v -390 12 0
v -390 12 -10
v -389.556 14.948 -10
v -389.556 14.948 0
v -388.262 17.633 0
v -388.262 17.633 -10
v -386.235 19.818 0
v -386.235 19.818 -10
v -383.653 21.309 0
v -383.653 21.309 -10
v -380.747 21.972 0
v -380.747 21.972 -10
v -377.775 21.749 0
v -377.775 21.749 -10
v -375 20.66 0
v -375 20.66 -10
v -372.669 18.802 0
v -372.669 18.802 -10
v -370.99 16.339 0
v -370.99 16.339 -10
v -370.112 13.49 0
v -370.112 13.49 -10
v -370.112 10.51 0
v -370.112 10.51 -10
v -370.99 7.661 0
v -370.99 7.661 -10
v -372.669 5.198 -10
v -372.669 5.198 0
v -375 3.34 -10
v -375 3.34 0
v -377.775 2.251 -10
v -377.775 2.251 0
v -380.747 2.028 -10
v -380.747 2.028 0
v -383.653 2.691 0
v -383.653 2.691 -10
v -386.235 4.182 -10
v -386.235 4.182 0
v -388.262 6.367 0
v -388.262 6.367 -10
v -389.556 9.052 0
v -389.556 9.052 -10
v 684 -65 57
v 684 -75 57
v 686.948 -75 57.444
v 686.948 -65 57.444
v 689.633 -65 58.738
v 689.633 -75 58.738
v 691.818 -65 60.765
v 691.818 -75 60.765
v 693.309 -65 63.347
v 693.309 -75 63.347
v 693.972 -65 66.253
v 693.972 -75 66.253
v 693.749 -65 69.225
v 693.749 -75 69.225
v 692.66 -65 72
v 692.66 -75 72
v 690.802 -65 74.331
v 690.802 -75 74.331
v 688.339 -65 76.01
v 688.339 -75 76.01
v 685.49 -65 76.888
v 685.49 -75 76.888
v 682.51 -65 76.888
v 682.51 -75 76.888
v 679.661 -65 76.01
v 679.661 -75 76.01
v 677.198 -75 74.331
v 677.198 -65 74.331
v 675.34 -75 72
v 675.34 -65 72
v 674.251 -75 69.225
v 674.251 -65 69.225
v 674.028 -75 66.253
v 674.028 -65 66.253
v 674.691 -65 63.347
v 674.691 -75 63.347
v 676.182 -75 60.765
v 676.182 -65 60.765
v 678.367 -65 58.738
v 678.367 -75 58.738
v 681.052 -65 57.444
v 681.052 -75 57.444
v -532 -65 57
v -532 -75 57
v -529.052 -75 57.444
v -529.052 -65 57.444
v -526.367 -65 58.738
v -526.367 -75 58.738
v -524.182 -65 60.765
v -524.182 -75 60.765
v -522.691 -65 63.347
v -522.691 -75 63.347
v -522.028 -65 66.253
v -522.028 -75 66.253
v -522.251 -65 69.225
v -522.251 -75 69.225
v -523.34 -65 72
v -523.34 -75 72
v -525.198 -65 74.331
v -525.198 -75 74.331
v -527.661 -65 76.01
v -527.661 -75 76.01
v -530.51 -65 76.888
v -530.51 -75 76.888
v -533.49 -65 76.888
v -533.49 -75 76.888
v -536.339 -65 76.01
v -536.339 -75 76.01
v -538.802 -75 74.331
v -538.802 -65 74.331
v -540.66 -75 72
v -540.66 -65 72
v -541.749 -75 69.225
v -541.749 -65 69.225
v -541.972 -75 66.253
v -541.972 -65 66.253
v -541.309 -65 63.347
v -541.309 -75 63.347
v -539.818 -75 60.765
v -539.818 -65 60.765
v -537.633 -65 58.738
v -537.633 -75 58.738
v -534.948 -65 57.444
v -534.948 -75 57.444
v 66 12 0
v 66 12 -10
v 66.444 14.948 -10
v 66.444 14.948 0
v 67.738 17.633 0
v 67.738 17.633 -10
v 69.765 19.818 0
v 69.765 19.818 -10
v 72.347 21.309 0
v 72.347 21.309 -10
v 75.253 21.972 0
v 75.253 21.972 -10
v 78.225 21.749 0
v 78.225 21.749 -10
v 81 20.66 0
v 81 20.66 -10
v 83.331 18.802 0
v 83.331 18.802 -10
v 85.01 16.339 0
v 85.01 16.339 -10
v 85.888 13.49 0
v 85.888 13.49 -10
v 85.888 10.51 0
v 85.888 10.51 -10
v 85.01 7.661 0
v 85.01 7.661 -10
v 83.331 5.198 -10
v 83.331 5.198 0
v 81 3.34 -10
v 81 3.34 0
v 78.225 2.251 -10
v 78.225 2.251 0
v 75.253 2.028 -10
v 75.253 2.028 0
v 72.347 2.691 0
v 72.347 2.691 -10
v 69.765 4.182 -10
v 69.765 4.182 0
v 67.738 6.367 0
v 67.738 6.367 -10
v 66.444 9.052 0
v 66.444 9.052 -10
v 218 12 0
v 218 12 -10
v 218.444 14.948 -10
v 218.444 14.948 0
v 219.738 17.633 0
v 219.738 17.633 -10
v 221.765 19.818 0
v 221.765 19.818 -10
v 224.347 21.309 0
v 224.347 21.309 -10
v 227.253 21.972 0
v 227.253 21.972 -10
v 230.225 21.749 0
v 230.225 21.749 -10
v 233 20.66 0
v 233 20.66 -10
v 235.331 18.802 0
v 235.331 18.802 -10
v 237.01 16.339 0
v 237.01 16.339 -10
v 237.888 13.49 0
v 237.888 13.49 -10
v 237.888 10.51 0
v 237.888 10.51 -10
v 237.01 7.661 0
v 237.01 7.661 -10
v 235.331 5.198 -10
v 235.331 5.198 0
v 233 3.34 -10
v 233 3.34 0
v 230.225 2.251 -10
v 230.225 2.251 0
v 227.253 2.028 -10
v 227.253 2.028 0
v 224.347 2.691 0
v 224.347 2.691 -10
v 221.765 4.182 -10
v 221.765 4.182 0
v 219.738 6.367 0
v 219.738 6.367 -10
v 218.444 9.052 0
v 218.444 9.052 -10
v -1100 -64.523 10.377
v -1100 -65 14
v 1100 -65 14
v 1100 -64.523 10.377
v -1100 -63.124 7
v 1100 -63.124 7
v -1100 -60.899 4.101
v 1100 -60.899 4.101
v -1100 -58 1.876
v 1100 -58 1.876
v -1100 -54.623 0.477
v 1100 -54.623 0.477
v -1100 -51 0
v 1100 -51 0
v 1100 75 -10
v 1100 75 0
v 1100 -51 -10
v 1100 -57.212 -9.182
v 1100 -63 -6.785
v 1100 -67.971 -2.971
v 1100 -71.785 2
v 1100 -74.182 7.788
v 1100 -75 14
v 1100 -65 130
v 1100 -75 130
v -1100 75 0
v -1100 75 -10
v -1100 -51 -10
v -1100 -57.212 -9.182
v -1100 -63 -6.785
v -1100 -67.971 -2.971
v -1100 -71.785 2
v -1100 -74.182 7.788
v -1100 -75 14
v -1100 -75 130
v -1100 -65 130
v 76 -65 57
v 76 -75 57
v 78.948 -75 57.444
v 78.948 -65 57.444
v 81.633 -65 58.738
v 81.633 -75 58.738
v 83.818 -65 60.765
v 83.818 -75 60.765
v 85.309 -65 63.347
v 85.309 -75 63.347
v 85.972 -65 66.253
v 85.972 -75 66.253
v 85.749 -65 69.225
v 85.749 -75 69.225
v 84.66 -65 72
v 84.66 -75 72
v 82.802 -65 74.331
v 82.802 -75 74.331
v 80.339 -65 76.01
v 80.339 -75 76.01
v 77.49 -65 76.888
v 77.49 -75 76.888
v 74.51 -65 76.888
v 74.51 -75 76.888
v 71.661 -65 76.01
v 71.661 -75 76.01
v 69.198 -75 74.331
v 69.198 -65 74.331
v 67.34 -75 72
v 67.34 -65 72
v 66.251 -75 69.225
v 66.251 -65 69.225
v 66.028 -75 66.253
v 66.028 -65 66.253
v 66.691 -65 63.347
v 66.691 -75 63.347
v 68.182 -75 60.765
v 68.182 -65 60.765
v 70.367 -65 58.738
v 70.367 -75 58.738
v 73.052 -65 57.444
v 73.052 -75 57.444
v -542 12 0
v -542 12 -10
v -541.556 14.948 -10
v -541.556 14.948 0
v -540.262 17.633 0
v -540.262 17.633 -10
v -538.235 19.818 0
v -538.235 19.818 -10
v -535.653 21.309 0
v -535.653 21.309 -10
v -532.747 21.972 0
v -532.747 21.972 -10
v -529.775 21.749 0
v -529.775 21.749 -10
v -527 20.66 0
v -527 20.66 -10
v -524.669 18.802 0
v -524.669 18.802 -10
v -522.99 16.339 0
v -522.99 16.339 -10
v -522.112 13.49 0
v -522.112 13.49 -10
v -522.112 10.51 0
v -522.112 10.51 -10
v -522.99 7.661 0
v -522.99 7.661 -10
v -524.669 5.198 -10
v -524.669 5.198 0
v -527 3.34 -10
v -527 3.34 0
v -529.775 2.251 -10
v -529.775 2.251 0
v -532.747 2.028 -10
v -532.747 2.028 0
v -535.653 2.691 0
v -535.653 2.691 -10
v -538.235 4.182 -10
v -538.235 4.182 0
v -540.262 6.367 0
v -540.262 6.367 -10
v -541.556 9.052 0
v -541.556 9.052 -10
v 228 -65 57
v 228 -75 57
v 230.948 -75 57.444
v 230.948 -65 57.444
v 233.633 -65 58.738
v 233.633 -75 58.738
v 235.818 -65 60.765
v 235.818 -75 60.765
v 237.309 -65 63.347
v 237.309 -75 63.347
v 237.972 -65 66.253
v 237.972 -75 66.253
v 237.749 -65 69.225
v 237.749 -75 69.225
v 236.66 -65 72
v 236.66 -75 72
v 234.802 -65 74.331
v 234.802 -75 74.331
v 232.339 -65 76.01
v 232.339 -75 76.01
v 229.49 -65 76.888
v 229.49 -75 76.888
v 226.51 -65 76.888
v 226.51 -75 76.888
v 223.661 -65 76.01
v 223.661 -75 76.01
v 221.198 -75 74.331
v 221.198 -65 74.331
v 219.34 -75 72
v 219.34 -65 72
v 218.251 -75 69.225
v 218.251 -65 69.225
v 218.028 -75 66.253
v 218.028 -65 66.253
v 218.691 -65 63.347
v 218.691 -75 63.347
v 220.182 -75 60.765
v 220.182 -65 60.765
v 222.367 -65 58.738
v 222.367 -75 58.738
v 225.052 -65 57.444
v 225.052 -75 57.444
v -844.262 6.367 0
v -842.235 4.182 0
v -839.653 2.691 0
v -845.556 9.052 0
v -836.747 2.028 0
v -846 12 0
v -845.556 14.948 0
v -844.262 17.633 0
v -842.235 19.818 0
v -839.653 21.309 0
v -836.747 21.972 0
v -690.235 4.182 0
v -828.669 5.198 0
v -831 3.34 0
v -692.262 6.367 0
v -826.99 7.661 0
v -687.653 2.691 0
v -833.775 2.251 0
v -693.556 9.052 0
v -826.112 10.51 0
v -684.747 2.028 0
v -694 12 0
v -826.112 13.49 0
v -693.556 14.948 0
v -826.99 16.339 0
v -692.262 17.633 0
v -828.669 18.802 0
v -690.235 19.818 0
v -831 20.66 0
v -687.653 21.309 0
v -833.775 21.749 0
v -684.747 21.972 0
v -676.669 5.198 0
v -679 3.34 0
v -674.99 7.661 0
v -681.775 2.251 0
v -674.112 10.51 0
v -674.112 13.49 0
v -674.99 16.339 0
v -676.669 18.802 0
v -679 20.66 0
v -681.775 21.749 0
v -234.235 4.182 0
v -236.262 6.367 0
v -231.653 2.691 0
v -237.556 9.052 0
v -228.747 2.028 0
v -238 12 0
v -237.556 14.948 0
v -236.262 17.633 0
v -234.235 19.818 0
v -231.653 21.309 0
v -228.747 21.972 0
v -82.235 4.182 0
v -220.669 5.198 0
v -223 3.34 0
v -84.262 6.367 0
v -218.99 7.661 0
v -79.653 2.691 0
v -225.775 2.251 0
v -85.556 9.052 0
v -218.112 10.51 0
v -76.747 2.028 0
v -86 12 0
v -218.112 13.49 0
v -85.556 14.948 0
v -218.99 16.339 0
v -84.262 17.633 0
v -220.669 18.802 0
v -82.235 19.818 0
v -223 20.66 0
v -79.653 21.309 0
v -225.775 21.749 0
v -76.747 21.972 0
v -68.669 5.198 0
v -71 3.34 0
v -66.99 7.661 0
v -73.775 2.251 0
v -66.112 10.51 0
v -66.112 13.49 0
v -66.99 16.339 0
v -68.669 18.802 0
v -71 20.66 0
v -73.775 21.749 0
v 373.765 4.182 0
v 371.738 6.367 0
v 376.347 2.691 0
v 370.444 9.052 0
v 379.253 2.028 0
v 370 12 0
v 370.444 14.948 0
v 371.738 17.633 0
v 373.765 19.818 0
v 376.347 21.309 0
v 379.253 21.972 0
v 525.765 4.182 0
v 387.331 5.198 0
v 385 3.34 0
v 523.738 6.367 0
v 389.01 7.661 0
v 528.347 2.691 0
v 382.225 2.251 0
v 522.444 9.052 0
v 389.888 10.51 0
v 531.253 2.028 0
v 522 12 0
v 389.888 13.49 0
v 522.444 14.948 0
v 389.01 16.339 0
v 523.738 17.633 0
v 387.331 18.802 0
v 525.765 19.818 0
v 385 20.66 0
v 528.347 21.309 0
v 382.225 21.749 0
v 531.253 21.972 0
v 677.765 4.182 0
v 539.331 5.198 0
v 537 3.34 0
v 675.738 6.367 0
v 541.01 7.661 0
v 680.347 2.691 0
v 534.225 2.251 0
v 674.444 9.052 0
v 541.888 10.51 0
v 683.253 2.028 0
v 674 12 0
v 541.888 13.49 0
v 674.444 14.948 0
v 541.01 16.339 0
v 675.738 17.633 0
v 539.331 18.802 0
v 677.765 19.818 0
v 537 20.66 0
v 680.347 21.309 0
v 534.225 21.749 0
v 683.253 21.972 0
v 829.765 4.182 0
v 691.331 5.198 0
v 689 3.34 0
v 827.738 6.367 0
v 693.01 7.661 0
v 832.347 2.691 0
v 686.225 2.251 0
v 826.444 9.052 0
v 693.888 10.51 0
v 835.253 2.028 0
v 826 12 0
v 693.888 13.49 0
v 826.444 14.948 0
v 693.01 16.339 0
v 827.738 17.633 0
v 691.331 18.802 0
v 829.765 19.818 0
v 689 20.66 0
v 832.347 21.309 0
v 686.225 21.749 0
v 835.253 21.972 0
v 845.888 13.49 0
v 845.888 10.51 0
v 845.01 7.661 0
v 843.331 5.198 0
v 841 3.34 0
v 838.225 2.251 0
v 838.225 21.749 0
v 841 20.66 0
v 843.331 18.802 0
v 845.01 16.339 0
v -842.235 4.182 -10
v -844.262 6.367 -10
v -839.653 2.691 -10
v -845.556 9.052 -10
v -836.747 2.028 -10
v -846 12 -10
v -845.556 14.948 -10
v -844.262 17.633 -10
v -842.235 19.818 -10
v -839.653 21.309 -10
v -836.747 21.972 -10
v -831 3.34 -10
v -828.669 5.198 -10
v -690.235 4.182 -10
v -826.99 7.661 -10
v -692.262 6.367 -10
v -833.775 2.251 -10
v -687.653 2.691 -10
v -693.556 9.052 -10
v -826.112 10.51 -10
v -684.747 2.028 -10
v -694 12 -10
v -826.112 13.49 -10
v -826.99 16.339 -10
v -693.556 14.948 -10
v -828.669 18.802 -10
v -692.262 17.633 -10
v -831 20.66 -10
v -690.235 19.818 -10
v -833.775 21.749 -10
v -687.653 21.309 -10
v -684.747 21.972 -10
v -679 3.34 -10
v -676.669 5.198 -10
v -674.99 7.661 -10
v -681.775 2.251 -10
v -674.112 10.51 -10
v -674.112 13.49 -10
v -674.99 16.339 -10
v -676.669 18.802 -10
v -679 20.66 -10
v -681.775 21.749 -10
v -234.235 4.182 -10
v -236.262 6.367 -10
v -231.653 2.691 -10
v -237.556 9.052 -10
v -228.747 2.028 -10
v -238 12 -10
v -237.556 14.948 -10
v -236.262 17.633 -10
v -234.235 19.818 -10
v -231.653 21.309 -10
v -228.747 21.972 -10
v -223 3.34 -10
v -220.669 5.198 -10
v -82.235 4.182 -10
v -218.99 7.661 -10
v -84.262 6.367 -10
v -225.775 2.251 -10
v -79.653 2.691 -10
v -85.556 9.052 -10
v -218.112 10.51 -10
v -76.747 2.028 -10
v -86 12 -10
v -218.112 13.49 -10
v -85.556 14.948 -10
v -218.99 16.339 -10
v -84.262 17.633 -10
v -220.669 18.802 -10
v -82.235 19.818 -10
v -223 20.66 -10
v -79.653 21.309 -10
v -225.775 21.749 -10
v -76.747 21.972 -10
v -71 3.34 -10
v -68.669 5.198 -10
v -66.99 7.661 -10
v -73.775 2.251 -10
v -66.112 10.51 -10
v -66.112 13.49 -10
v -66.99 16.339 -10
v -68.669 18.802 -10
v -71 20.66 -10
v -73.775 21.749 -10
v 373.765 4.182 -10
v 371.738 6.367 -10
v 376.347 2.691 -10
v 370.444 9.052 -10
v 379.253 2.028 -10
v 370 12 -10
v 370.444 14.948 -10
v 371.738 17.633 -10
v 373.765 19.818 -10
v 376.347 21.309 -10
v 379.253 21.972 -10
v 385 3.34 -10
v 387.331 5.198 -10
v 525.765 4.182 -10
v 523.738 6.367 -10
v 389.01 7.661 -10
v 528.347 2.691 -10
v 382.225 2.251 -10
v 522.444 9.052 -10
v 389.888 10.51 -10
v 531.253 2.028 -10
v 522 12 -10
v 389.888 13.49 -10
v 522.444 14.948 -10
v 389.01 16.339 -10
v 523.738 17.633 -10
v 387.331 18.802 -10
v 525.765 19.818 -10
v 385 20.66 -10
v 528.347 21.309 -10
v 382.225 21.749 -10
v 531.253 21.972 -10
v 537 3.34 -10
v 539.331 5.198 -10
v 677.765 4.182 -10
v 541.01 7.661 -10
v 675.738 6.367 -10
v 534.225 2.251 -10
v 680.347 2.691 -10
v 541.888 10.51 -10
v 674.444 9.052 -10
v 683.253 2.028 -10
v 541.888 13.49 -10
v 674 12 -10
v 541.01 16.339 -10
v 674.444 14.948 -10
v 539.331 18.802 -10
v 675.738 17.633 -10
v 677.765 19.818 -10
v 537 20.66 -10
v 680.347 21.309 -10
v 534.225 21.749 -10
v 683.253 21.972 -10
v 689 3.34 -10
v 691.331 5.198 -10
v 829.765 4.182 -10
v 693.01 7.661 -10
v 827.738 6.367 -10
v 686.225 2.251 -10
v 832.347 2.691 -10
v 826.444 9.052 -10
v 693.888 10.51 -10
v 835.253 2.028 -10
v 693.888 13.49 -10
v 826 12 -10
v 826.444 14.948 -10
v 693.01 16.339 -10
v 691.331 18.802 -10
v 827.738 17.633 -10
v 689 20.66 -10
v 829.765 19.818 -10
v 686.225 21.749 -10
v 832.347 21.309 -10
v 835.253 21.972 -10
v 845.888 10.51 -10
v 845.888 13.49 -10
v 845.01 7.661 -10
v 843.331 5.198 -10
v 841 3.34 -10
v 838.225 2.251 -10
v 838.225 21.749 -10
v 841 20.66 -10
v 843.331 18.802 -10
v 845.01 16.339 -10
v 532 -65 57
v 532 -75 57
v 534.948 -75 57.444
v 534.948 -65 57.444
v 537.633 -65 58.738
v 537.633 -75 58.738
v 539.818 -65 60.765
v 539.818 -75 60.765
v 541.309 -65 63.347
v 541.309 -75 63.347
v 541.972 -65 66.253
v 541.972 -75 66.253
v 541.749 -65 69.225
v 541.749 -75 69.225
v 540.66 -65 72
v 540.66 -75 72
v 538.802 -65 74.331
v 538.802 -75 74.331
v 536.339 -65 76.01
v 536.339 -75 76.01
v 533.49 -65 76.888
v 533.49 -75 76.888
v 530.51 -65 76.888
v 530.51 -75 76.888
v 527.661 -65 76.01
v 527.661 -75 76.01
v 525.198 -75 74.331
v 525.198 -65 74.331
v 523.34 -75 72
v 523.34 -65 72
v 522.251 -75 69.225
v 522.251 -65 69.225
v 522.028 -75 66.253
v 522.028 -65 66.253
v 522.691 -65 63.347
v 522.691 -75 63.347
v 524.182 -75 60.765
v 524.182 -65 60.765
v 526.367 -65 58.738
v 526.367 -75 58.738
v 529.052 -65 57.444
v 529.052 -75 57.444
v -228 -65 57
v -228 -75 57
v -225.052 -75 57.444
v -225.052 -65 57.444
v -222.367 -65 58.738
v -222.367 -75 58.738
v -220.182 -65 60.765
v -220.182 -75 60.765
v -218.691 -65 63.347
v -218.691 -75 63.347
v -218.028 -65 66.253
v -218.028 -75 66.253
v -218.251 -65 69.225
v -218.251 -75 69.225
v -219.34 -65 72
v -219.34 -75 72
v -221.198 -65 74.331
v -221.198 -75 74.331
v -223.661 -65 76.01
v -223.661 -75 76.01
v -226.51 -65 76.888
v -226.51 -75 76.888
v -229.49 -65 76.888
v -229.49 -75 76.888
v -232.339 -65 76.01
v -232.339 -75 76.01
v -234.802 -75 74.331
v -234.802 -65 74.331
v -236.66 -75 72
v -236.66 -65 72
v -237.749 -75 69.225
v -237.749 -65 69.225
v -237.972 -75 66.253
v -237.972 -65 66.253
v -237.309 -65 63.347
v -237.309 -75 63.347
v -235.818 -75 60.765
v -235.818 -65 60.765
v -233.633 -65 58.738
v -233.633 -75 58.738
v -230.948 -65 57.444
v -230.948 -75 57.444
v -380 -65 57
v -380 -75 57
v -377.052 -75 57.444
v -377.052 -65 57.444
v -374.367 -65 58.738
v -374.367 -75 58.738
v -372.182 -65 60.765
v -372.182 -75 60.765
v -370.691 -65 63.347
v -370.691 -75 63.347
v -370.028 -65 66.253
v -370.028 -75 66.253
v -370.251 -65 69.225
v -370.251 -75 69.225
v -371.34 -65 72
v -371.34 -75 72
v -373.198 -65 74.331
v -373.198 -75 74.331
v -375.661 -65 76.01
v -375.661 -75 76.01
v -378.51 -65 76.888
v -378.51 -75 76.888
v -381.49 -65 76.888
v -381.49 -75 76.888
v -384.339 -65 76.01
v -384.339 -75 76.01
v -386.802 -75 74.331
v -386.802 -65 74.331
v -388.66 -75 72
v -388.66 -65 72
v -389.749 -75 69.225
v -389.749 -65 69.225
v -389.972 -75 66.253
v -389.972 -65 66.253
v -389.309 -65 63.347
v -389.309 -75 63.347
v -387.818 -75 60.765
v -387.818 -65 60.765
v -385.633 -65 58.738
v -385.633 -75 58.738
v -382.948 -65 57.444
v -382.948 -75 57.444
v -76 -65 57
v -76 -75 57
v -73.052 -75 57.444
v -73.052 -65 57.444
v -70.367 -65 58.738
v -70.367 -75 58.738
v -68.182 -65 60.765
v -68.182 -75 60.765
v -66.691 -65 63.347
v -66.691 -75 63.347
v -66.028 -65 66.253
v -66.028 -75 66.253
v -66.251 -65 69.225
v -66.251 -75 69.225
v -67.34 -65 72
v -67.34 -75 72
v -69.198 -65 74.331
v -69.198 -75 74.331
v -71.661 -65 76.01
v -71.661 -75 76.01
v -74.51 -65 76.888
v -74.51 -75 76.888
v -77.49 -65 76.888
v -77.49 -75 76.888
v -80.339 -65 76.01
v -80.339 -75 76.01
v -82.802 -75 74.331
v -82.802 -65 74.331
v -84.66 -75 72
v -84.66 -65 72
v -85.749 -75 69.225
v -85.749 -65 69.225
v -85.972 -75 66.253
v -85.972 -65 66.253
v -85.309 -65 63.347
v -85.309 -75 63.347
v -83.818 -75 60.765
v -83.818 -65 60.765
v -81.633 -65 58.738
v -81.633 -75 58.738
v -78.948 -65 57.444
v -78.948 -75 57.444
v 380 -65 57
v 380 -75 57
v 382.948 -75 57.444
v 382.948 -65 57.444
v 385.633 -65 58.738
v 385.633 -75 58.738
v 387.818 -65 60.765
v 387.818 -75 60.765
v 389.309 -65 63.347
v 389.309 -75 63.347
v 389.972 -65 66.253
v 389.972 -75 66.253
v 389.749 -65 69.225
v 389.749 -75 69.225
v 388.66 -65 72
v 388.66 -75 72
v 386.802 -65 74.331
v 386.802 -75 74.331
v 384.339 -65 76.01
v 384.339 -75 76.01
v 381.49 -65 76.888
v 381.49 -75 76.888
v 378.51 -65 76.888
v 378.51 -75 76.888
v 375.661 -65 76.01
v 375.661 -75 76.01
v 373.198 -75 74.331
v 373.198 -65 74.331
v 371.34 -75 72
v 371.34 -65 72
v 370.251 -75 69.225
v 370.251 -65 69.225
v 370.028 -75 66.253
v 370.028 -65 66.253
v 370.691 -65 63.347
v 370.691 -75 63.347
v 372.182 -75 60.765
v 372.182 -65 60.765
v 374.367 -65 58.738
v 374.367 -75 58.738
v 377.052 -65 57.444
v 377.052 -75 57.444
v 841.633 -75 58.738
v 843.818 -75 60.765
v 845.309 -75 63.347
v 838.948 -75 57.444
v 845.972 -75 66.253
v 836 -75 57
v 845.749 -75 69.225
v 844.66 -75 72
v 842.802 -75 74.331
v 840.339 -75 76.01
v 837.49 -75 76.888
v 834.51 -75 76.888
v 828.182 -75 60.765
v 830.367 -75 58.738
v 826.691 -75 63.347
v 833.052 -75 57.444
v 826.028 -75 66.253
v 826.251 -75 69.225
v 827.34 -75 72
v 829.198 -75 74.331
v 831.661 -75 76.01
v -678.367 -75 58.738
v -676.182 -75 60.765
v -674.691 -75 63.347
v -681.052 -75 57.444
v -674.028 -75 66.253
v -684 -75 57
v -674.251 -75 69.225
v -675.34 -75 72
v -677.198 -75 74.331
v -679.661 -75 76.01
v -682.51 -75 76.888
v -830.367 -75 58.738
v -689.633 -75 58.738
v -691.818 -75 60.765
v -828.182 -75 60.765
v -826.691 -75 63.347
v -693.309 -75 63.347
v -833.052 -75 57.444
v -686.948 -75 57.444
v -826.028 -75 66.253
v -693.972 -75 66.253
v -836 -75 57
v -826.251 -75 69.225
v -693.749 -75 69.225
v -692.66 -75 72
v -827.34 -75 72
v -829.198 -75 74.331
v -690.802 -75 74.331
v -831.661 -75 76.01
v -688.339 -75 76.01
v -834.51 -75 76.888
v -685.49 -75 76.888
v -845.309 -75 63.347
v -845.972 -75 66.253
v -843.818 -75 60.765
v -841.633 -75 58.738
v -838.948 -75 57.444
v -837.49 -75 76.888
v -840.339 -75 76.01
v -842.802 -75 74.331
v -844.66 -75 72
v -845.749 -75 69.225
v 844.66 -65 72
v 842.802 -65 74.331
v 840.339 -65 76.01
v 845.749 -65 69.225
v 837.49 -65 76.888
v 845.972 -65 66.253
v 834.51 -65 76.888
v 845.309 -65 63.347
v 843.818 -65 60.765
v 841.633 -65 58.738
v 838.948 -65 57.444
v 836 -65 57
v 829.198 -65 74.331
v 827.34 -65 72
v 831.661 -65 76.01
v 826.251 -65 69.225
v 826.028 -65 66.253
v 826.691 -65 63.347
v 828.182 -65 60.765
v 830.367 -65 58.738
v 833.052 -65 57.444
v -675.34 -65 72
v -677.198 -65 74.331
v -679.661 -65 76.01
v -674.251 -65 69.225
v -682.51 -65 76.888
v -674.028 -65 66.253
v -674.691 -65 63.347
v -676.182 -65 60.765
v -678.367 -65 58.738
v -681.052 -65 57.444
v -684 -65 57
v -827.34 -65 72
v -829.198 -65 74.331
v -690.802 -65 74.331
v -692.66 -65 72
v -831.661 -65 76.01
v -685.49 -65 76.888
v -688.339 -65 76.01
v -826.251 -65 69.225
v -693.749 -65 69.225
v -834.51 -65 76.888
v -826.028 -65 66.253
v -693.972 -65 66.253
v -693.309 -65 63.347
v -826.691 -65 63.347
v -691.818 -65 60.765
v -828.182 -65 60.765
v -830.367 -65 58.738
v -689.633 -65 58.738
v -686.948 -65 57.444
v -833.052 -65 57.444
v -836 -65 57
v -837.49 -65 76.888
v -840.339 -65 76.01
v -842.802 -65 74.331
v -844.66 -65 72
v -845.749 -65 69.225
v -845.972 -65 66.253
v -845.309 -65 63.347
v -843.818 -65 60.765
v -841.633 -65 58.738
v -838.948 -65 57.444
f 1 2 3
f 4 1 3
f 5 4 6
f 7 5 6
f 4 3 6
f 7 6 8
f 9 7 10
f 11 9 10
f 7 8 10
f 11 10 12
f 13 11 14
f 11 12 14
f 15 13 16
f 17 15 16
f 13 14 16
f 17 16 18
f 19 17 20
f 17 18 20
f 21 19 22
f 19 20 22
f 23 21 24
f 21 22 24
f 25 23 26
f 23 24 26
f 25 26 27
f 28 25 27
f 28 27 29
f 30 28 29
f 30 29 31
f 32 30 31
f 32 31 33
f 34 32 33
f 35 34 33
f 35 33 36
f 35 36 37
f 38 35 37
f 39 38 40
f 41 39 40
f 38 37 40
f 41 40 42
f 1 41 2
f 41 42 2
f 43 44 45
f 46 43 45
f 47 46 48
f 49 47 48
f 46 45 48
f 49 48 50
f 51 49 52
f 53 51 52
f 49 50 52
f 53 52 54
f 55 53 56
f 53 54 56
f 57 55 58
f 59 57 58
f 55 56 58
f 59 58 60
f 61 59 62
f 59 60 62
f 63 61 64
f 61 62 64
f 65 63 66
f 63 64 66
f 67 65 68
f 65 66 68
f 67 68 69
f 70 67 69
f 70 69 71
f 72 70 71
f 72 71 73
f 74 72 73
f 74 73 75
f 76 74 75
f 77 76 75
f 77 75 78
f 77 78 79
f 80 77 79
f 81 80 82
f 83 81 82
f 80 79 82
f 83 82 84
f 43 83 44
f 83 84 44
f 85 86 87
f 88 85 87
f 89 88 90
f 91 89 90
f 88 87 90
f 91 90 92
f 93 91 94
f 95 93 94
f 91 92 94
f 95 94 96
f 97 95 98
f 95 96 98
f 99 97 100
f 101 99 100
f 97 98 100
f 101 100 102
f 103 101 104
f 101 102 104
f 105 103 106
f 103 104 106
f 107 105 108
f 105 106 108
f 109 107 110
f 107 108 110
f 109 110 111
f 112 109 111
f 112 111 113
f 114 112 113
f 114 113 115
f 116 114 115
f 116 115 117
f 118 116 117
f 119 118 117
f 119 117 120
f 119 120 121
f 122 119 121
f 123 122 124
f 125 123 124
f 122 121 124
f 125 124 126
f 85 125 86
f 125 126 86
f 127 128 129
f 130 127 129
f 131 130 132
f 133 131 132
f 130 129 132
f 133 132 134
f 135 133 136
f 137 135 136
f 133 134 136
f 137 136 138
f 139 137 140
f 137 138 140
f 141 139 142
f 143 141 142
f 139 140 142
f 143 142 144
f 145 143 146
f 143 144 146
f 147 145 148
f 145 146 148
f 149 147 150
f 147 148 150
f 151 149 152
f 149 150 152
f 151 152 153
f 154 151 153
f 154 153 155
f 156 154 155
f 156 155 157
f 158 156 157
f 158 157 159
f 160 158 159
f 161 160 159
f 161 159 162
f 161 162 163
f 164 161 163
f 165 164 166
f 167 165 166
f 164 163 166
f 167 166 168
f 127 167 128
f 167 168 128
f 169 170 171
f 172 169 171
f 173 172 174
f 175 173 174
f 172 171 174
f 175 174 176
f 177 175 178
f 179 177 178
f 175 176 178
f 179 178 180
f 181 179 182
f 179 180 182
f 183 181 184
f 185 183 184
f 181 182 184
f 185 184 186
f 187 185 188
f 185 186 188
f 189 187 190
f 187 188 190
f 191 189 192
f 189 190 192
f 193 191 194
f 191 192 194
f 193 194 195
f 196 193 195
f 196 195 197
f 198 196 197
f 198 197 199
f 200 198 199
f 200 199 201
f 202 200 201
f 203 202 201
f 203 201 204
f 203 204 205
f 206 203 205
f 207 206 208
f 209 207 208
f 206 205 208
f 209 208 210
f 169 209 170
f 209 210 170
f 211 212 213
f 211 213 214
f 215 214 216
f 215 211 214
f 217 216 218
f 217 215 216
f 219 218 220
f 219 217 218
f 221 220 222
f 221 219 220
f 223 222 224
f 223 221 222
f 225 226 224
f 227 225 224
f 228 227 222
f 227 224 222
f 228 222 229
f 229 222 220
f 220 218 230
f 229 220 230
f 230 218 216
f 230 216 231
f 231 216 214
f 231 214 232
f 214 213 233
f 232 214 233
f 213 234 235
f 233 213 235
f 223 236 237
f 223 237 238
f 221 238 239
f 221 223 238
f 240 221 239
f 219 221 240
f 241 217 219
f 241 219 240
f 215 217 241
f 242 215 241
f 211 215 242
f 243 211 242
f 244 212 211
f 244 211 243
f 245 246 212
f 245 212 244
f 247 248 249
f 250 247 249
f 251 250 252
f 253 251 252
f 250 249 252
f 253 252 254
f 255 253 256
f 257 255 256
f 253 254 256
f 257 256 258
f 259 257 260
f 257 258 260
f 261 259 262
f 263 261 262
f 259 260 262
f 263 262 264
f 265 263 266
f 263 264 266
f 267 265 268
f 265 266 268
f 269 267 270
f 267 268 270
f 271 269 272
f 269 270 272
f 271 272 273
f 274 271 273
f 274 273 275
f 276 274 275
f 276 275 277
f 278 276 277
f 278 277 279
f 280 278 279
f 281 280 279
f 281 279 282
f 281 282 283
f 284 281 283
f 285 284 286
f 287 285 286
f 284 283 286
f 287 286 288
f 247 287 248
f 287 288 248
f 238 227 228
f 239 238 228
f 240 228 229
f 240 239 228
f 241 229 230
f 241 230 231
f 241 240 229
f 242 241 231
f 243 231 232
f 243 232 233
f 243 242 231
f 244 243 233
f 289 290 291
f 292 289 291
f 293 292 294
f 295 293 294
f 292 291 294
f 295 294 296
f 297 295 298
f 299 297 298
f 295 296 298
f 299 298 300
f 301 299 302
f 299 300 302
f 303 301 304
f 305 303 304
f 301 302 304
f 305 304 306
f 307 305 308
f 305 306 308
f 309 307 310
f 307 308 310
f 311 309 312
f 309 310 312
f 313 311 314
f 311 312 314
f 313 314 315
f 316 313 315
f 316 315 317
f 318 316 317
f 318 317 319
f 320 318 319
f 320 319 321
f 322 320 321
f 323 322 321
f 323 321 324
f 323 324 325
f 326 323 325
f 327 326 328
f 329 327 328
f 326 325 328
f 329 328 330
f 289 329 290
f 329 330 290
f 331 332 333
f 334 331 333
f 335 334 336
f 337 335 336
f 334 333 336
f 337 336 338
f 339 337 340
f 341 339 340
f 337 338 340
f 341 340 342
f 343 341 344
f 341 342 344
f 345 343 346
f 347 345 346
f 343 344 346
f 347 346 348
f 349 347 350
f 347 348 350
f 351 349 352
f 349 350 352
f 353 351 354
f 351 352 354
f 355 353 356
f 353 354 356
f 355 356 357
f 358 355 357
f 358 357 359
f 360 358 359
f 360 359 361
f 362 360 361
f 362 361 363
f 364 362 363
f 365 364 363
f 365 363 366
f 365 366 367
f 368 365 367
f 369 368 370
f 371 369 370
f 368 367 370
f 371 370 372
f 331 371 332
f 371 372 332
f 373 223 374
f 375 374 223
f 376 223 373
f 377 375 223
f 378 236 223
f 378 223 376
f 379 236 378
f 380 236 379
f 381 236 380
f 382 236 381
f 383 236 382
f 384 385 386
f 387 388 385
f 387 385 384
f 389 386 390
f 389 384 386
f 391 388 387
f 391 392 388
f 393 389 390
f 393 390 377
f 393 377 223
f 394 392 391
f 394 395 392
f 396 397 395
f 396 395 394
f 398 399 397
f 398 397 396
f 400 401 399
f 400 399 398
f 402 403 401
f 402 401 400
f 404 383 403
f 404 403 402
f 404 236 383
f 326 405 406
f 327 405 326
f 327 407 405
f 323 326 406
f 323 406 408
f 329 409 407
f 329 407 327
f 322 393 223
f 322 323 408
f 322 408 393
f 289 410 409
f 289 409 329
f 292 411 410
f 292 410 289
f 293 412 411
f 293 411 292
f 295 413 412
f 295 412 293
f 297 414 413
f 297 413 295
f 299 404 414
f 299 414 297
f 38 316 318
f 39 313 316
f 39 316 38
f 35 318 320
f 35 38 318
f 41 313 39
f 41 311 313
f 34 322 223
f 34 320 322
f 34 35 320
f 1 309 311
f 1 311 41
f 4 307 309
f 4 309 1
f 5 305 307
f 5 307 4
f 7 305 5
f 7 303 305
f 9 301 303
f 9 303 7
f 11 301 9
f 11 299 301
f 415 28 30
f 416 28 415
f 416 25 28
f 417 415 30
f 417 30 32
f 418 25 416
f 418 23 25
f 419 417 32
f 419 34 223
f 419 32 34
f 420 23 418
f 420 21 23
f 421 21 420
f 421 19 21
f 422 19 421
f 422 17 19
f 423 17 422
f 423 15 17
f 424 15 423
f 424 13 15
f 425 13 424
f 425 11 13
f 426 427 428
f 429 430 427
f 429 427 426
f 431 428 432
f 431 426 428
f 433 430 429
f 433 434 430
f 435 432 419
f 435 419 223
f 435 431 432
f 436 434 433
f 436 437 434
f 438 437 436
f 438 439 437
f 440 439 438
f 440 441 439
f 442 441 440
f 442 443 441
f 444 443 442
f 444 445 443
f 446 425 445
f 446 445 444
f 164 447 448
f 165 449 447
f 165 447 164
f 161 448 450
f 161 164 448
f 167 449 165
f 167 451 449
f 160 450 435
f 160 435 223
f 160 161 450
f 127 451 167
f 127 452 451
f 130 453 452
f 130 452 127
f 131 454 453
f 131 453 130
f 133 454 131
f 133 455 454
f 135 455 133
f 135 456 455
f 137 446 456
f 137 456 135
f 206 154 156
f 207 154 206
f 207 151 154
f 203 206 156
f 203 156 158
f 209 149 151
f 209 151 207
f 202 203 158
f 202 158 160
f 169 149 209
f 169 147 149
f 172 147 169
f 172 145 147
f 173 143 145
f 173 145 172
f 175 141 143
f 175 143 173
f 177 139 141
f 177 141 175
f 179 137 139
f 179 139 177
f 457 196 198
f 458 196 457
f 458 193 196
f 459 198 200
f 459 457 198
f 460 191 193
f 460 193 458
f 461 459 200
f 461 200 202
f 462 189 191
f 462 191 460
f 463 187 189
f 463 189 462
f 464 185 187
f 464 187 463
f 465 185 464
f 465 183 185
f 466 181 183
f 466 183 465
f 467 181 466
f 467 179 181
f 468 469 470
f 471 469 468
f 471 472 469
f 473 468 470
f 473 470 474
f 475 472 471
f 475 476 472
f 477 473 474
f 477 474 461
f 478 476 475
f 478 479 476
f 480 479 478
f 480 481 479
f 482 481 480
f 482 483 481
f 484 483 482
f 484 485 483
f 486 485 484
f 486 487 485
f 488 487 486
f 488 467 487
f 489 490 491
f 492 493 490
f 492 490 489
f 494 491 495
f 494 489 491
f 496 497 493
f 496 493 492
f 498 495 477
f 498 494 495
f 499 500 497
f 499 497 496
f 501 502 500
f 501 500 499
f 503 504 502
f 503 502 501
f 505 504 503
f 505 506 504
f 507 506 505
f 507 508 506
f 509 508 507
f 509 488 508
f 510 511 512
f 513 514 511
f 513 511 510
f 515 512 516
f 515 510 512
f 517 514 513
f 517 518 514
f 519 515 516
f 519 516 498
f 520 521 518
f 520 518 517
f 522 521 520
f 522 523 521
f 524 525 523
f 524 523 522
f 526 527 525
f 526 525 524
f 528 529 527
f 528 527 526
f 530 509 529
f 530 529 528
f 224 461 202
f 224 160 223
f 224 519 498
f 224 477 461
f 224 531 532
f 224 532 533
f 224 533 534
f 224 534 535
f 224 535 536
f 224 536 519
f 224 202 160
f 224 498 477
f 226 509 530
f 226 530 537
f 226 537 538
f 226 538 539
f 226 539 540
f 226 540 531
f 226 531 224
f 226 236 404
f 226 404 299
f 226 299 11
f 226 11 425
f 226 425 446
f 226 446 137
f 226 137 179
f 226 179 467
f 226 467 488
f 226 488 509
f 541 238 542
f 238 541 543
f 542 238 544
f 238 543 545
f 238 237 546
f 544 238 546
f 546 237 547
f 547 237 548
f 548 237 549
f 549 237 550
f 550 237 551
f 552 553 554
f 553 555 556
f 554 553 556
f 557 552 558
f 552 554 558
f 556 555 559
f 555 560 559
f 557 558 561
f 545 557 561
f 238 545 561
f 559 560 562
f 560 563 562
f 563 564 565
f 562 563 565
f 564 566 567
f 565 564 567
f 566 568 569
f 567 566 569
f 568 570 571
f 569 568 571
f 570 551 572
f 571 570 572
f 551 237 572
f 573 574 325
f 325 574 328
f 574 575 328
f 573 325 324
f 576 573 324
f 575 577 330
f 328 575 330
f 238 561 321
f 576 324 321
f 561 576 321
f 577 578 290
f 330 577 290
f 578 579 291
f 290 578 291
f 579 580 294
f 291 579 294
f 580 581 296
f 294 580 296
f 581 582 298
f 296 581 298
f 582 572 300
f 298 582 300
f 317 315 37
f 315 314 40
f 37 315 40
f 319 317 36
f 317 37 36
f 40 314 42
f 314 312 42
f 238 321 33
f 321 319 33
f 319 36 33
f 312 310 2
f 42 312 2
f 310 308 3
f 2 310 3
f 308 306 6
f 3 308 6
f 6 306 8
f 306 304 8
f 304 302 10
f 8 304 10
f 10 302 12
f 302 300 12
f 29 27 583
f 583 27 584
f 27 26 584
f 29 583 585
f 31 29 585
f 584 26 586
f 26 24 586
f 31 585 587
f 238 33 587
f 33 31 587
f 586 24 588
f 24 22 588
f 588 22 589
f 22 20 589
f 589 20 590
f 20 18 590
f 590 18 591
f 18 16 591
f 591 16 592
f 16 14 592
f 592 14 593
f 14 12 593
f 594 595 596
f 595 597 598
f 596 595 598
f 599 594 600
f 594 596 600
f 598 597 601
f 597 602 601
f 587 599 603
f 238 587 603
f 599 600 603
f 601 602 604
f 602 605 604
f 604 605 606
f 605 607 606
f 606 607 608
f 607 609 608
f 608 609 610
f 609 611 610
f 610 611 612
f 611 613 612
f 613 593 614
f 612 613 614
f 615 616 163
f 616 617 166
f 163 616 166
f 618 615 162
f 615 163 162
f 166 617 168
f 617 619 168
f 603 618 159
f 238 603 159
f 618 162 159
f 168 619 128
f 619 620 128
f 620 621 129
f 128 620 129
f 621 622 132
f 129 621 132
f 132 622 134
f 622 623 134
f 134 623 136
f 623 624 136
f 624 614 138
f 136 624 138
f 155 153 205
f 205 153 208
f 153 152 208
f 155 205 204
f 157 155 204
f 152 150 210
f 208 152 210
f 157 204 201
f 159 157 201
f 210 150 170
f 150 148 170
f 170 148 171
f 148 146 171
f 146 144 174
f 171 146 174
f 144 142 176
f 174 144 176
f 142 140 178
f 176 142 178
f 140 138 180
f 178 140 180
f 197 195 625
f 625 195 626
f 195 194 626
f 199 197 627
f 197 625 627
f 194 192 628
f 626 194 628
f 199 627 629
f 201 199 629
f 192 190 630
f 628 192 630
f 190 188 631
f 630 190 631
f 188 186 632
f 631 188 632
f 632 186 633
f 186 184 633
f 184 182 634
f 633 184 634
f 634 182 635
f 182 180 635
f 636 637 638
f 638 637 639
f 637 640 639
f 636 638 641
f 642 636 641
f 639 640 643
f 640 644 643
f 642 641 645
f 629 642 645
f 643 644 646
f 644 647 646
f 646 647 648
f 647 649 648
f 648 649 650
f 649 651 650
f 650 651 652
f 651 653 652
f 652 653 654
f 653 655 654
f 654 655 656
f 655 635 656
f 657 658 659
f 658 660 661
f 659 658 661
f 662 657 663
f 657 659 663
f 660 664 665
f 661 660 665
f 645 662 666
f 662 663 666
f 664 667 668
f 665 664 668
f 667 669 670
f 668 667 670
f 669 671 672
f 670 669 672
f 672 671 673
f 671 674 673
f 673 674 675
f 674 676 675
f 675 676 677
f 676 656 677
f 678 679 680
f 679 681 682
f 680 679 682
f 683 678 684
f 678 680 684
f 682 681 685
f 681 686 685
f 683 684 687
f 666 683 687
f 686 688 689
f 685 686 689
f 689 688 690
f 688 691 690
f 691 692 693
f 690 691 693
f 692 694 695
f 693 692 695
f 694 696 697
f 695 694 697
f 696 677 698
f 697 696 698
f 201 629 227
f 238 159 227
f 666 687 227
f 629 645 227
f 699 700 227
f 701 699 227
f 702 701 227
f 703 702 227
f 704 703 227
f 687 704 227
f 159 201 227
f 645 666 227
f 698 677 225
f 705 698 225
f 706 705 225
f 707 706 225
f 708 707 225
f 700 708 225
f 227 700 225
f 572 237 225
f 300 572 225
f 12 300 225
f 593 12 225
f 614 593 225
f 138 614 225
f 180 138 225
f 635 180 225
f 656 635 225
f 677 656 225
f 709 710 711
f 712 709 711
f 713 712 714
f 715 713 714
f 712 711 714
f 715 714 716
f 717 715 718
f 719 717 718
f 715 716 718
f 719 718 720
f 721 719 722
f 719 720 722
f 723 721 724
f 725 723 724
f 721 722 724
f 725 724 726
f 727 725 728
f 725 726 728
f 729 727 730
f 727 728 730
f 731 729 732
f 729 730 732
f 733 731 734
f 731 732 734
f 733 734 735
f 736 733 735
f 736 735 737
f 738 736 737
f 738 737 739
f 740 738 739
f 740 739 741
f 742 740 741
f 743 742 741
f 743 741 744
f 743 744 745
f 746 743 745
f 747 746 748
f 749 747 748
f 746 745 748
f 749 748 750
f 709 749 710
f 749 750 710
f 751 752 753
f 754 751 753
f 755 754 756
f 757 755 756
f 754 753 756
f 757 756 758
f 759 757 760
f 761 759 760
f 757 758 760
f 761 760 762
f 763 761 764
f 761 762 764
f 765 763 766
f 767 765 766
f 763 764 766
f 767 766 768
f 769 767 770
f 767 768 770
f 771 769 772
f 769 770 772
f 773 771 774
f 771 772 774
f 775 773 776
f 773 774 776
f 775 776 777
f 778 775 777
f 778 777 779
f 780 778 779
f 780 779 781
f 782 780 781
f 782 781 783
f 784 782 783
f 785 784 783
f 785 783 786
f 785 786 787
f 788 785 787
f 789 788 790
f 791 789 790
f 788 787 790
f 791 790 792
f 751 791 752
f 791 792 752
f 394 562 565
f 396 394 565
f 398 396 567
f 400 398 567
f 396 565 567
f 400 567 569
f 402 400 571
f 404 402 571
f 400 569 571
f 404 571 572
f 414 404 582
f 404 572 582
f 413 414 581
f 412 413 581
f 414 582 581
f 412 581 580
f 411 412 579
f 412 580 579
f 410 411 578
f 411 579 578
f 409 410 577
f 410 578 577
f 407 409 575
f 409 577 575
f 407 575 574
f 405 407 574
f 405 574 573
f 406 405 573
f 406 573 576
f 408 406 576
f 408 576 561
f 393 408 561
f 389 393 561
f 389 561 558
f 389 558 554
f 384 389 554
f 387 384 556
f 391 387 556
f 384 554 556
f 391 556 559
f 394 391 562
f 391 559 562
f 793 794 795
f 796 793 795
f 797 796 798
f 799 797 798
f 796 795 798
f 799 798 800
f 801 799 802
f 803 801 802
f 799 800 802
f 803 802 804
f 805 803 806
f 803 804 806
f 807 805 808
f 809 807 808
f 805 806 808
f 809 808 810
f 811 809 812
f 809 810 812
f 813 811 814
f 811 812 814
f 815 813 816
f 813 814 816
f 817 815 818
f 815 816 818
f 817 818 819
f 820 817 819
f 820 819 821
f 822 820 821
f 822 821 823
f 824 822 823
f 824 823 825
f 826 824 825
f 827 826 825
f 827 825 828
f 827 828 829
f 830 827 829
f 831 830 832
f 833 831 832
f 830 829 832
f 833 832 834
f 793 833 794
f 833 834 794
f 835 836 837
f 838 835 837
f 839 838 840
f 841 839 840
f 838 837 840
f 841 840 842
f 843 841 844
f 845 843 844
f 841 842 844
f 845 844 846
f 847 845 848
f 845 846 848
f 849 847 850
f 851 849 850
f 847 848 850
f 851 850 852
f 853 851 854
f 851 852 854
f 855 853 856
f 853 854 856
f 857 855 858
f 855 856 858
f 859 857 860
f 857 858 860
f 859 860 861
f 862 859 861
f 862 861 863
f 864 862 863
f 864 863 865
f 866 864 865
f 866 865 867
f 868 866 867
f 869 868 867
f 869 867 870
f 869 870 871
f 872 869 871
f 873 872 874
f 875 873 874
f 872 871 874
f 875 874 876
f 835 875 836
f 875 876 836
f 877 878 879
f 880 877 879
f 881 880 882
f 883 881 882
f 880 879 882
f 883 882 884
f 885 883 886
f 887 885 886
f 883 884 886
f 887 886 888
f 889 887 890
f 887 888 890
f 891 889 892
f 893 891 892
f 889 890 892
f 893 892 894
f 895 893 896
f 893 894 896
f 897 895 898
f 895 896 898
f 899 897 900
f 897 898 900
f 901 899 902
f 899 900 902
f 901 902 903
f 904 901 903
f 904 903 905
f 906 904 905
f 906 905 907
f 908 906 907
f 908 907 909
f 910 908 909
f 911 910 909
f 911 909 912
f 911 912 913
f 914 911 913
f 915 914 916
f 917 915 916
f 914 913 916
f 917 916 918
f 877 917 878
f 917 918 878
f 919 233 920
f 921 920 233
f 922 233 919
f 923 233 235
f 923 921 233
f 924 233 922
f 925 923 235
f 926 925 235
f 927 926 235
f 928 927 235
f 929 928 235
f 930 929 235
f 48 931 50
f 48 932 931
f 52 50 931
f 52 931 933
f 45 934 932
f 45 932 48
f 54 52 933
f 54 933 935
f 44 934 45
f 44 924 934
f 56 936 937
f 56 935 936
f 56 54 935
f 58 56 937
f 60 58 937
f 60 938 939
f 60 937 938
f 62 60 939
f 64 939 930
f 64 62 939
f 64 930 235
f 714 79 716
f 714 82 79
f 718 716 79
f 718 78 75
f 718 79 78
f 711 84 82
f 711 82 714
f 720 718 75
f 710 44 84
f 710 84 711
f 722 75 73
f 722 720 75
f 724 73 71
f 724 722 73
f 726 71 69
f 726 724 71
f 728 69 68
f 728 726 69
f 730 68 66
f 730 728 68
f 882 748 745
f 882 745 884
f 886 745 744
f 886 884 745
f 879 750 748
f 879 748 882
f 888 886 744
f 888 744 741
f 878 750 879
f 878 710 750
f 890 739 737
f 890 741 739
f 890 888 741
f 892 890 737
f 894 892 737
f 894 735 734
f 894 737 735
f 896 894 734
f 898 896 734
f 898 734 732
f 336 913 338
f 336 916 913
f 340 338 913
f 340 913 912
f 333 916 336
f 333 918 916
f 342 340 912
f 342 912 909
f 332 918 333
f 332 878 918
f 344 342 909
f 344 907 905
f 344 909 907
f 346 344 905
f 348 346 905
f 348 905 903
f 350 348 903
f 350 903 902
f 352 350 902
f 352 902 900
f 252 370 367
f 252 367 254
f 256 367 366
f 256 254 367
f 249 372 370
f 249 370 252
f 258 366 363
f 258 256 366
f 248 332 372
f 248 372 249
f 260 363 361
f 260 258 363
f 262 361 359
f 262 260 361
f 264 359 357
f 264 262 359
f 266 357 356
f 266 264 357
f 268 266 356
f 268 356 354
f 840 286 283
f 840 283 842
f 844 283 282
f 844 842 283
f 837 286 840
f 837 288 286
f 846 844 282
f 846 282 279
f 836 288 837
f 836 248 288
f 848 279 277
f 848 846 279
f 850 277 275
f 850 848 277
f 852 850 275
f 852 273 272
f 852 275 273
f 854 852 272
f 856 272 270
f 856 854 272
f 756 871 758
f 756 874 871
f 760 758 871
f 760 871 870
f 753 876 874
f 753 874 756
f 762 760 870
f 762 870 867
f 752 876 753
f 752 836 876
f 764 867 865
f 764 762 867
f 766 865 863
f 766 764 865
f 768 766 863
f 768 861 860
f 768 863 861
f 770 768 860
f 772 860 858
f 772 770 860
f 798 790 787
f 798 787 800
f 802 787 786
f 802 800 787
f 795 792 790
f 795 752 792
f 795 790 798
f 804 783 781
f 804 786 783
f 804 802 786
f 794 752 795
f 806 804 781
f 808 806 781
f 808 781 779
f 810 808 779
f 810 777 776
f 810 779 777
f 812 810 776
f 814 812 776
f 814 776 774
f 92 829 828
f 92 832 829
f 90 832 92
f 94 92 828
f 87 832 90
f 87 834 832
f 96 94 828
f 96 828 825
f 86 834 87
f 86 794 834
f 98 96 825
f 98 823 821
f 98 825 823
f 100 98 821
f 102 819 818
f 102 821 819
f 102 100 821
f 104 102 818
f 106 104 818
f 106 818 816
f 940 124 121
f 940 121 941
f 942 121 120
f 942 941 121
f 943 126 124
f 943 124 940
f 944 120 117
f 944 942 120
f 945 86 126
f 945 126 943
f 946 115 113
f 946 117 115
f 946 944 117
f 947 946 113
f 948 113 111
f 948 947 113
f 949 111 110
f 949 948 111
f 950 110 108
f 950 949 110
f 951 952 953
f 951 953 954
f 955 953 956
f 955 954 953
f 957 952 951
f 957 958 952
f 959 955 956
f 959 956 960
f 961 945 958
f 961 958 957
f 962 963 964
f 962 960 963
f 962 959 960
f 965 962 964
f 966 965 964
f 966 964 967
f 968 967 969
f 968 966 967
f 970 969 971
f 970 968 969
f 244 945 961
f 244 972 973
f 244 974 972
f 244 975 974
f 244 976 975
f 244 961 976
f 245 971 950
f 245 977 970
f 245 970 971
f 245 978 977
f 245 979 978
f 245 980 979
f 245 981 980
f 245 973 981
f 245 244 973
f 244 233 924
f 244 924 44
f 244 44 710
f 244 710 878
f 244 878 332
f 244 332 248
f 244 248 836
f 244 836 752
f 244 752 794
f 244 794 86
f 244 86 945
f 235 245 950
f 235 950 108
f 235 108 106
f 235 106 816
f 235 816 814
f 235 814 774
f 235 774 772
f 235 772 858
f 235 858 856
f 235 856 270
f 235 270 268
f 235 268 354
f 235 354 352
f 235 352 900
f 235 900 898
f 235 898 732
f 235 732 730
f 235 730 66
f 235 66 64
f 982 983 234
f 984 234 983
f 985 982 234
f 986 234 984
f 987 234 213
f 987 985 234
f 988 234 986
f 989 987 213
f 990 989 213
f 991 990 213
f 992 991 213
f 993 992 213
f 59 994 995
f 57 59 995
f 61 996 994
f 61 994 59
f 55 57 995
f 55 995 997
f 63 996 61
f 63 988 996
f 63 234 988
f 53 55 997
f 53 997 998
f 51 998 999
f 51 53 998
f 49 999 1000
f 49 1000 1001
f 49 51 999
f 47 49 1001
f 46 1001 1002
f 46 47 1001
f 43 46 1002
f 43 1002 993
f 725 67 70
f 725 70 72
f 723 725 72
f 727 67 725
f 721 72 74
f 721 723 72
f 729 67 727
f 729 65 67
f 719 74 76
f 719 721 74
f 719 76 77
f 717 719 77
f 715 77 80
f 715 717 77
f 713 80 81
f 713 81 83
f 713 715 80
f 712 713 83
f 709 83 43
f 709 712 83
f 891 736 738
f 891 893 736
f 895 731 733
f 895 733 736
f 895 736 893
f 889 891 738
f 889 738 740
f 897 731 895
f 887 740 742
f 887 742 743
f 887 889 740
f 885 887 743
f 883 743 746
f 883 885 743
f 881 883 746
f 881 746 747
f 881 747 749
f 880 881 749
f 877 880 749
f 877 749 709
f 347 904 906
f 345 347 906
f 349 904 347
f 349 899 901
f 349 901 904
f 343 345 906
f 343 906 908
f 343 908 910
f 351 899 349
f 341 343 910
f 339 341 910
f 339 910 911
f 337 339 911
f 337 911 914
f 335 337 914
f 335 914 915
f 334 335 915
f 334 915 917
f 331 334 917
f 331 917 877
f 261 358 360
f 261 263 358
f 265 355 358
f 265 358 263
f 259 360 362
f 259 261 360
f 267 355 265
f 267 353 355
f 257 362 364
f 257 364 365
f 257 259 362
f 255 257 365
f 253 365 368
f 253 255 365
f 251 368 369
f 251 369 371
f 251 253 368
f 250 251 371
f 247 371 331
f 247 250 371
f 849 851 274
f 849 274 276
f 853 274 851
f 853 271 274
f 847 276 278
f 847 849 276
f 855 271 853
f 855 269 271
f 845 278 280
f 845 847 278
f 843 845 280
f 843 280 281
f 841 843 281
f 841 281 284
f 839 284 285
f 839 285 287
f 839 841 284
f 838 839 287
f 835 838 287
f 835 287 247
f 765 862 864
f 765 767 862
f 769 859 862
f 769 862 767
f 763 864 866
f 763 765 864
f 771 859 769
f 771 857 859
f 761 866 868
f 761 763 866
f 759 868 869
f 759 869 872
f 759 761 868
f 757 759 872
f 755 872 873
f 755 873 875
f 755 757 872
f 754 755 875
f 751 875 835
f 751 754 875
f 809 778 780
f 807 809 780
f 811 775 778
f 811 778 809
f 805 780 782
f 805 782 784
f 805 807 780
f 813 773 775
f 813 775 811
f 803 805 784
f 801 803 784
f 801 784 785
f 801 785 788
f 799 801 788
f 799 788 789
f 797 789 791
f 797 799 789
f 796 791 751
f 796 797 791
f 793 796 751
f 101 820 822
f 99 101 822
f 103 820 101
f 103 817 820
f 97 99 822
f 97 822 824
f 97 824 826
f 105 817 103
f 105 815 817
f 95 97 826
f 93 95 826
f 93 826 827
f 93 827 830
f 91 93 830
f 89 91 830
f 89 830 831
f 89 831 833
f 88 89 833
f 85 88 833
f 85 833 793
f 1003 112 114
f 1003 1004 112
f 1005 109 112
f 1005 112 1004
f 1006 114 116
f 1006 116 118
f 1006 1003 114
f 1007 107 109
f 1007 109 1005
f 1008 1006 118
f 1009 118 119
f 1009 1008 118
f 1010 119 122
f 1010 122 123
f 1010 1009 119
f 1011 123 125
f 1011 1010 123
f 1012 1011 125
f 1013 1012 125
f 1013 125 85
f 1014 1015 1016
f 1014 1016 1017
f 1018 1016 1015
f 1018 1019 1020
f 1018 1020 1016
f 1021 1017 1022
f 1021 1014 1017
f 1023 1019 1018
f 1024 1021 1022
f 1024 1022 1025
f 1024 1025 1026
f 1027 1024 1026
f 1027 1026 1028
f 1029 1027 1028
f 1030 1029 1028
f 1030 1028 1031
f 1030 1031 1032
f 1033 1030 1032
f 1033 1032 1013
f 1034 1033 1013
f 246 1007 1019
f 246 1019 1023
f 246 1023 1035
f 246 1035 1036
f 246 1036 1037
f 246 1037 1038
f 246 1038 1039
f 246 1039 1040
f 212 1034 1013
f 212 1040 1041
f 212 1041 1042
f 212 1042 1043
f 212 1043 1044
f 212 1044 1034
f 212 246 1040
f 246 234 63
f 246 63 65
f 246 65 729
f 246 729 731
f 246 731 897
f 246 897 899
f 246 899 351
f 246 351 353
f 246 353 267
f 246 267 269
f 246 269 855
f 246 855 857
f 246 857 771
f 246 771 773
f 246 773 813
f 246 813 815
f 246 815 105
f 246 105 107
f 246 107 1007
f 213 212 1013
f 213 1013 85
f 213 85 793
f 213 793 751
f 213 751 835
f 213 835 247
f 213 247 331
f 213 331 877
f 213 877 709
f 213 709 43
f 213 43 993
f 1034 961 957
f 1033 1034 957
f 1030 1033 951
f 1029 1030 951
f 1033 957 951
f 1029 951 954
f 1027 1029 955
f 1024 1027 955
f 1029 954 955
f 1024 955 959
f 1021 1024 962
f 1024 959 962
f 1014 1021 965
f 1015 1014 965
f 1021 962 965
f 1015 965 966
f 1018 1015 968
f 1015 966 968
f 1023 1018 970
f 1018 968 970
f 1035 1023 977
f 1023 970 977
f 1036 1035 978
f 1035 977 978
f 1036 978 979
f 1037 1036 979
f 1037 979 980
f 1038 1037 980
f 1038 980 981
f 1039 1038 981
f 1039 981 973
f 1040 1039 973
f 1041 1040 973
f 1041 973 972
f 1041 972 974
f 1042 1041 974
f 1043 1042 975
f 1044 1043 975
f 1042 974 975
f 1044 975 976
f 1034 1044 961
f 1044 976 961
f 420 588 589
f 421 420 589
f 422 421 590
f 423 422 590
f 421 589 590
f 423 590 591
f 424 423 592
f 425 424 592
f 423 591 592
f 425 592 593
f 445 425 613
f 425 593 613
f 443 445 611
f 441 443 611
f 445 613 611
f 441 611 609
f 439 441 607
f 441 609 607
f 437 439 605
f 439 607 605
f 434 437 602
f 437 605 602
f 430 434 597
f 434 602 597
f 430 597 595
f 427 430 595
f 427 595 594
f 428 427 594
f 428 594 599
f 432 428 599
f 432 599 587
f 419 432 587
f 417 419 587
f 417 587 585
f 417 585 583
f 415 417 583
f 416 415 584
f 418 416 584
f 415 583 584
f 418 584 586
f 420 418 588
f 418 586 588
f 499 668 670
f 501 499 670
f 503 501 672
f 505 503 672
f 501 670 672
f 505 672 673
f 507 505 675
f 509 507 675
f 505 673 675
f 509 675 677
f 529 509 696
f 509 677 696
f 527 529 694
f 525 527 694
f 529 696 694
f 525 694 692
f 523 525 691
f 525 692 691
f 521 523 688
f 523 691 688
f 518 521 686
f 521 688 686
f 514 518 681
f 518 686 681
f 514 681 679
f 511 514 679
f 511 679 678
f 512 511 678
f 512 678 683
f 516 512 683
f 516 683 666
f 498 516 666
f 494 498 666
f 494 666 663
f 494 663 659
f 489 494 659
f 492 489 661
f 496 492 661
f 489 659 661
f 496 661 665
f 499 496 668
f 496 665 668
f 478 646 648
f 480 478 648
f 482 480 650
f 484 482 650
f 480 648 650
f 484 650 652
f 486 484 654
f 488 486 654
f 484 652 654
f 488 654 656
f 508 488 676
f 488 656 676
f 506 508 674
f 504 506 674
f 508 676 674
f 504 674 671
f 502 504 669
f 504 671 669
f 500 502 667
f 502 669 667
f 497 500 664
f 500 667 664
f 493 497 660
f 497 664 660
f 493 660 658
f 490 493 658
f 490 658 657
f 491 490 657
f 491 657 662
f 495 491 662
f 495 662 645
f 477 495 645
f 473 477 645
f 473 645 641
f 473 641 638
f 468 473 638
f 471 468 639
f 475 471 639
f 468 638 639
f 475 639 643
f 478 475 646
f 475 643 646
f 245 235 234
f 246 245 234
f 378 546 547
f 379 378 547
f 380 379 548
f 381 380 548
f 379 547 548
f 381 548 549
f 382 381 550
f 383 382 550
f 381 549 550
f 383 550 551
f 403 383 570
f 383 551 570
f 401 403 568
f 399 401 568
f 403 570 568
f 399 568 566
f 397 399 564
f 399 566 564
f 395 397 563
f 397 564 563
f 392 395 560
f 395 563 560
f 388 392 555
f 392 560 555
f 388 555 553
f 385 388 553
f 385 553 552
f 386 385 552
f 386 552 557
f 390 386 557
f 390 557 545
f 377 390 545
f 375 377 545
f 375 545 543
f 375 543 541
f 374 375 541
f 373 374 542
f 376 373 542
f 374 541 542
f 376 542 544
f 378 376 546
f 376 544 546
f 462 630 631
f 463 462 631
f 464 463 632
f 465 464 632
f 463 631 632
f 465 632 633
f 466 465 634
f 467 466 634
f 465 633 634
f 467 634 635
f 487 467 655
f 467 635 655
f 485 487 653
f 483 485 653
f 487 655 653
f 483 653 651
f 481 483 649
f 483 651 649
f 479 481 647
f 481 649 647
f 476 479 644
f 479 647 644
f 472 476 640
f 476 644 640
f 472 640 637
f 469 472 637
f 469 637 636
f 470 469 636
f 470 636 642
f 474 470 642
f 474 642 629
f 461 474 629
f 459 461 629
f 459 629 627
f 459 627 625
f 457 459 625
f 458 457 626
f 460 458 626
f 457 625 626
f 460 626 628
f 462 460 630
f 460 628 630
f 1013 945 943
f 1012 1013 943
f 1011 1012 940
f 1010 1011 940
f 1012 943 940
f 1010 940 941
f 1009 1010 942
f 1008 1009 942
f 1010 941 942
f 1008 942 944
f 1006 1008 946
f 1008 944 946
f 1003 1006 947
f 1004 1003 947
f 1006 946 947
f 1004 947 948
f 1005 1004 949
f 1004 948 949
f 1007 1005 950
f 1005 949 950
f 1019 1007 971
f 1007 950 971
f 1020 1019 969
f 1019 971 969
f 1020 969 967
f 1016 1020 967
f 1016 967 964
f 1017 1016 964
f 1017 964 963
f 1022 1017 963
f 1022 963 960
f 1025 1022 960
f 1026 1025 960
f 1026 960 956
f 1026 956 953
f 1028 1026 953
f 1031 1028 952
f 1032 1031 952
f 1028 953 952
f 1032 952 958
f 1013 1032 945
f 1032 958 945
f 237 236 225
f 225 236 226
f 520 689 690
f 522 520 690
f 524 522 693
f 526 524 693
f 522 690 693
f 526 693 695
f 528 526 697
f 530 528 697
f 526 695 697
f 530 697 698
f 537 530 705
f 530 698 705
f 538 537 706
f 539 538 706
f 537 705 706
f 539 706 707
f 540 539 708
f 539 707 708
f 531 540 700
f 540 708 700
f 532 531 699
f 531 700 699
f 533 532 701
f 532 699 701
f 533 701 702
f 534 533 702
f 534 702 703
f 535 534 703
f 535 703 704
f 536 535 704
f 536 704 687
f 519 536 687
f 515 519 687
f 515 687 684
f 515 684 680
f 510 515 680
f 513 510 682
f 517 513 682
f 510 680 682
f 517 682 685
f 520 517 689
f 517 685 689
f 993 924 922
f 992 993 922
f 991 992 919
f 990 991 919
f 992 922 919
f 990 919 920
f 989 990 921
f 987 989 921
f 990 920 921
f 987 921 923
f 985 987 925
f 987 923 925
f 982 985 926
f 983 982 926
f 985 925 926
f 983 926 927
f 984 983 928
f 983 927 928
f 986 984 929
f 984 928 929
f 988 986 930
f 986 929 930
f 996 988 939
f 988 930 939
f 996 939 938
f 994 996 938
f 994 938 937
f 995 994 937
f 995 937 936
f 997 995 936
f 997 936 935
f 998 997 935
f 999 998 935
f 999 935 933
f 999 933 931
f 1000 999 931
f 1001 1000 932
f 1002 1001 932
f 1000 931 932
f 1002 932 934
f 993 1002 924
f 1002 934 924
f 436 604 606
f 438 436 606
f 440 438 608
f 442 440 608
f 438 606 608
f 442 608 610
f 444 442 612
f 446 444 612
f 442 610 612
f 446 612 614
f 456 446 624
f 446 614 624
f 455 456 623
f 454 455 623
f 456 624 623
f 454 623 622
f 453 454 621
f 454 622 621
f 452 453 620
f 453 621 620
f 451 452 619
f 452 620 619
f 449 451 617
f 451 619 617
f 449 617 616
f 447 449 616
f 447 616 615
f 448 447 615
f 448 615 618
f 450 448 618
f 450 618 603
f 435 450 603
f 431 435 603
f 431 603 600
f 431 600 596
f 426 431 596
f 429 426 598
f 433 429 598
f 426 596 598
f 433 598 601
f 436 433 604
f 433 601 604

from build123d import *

# Parameters (mm, degrees)
SKETCH1_W                    = 2200
SKETCH1_H                    = 150
BASE_FLANGE1_DEPTH           = 10
EDGE_FLANGE1_STRIP_W         = 68
EDGE_FLANGE1_STRIP_H         = 10
EDGE_FLANGE1_STRIP_CUT_DEPTH = 2200
EDGE_FLANGE1_DEPTH           = 2200
SKETCH12_R                   = 10
CUT_EXTRUDE1_DEPTH           = 10
SKETCH13_R                   = 10
CUT_EXTRUDE2_DEPTH           = 10
LPATTERN1_COUNT              = 12
LPATTERN1_PITCH              = 152


# Sheet-metal steps are written as plain solids
with BuildPart() as part:
    # Sketch1 → Base-Flange1 (new body)
    with BuildSketch(Plane.XY):
        Rectangle(SKETCH1_W, SKETCH1_H)
    extrude(amount=-BASE_FLANGE1_DEPTH)

    # Edge-Flange1 strip (across the edge) → Edge-Flange1 strip cut (cut)
    with BuildSketch(Plane(origin=(-1100, -75, 0), x_dir=(0, 1, 0), z_dir=(1, 0, 0))):
        with Locations((-10, -5)):
            Rectangle(EDGE_FLANGE1_STRIP_W, EDGE_FLANGE1_STRIP_H)
    extrude(amount=EDGE_FLANGE1_STRIP_CUT_DEPTH, mode=Mode.SUBTRACT)

    # Edge-Flange1 section (across the edge) → Edge-Flange1 (add)
    with BuildSketch(Plane(origin=(-1100, -75, 0), x_dir=(0, 1, 0), z_dir=(1, 0, 0))):
        with BuildLine():
            Line((0, 14), (0, 130))
            Line((0, 130), (10, 130))
            Line((10, 130), (10, 14))
            ThreePointArc((10, 14), (14.100505063, 4.100505063), (24, 0))
            Line((24, 0), (24, -10))
            ThreePointArc((24, -10), (7.029437252, -2.970562748), (0, 14))
        make_face()
    extrude(amount=EDGE_FLANGE1_DEPTH)

    # Sketch12 → Cut-Extrude1 (cut)
    with BuildSketch(Plane(origin=(0, -75, 0), x_dir=(-1, 0, 0), z_dir=(0, -1, 0))):
        with Locations(Location((836, -67, 0), (0, 0, 90))):
            Circle(SKETCH12_R)
    cut_extrude1 = extrude(amount=-CUT_EXTRUDE1_DEPTH, mode=Mode.SUBTRACT)

    # Sketch13 → Cut-Extrude2 (cut)
    with BuildSketch(Plane(origin=(0, 0, -10), x_dir=(-1, 0, 0), z_dir=(0, 0, -1))):
        with Locations((836, 12)):
            Circle(SKETCH13_R)
    cut_extrude2 = extrude(amount=-CUT_EXTRUDE2_DEPTH, mode=Mode.SUBTRACT)

    # LPattern1: Cut-Extrude1, Cut-Extrude2 ×12
    with Locations(*[(i * LPATTERN1_PITCH, 0, 0) for i in range(1, LPATTERN1_COUNT)]):
        add(cut_extrude1, mode=Mode.SUBTRACT)
        add(cut_extrude2, mode=Mode.SUBTRACT)


solid = part.part
